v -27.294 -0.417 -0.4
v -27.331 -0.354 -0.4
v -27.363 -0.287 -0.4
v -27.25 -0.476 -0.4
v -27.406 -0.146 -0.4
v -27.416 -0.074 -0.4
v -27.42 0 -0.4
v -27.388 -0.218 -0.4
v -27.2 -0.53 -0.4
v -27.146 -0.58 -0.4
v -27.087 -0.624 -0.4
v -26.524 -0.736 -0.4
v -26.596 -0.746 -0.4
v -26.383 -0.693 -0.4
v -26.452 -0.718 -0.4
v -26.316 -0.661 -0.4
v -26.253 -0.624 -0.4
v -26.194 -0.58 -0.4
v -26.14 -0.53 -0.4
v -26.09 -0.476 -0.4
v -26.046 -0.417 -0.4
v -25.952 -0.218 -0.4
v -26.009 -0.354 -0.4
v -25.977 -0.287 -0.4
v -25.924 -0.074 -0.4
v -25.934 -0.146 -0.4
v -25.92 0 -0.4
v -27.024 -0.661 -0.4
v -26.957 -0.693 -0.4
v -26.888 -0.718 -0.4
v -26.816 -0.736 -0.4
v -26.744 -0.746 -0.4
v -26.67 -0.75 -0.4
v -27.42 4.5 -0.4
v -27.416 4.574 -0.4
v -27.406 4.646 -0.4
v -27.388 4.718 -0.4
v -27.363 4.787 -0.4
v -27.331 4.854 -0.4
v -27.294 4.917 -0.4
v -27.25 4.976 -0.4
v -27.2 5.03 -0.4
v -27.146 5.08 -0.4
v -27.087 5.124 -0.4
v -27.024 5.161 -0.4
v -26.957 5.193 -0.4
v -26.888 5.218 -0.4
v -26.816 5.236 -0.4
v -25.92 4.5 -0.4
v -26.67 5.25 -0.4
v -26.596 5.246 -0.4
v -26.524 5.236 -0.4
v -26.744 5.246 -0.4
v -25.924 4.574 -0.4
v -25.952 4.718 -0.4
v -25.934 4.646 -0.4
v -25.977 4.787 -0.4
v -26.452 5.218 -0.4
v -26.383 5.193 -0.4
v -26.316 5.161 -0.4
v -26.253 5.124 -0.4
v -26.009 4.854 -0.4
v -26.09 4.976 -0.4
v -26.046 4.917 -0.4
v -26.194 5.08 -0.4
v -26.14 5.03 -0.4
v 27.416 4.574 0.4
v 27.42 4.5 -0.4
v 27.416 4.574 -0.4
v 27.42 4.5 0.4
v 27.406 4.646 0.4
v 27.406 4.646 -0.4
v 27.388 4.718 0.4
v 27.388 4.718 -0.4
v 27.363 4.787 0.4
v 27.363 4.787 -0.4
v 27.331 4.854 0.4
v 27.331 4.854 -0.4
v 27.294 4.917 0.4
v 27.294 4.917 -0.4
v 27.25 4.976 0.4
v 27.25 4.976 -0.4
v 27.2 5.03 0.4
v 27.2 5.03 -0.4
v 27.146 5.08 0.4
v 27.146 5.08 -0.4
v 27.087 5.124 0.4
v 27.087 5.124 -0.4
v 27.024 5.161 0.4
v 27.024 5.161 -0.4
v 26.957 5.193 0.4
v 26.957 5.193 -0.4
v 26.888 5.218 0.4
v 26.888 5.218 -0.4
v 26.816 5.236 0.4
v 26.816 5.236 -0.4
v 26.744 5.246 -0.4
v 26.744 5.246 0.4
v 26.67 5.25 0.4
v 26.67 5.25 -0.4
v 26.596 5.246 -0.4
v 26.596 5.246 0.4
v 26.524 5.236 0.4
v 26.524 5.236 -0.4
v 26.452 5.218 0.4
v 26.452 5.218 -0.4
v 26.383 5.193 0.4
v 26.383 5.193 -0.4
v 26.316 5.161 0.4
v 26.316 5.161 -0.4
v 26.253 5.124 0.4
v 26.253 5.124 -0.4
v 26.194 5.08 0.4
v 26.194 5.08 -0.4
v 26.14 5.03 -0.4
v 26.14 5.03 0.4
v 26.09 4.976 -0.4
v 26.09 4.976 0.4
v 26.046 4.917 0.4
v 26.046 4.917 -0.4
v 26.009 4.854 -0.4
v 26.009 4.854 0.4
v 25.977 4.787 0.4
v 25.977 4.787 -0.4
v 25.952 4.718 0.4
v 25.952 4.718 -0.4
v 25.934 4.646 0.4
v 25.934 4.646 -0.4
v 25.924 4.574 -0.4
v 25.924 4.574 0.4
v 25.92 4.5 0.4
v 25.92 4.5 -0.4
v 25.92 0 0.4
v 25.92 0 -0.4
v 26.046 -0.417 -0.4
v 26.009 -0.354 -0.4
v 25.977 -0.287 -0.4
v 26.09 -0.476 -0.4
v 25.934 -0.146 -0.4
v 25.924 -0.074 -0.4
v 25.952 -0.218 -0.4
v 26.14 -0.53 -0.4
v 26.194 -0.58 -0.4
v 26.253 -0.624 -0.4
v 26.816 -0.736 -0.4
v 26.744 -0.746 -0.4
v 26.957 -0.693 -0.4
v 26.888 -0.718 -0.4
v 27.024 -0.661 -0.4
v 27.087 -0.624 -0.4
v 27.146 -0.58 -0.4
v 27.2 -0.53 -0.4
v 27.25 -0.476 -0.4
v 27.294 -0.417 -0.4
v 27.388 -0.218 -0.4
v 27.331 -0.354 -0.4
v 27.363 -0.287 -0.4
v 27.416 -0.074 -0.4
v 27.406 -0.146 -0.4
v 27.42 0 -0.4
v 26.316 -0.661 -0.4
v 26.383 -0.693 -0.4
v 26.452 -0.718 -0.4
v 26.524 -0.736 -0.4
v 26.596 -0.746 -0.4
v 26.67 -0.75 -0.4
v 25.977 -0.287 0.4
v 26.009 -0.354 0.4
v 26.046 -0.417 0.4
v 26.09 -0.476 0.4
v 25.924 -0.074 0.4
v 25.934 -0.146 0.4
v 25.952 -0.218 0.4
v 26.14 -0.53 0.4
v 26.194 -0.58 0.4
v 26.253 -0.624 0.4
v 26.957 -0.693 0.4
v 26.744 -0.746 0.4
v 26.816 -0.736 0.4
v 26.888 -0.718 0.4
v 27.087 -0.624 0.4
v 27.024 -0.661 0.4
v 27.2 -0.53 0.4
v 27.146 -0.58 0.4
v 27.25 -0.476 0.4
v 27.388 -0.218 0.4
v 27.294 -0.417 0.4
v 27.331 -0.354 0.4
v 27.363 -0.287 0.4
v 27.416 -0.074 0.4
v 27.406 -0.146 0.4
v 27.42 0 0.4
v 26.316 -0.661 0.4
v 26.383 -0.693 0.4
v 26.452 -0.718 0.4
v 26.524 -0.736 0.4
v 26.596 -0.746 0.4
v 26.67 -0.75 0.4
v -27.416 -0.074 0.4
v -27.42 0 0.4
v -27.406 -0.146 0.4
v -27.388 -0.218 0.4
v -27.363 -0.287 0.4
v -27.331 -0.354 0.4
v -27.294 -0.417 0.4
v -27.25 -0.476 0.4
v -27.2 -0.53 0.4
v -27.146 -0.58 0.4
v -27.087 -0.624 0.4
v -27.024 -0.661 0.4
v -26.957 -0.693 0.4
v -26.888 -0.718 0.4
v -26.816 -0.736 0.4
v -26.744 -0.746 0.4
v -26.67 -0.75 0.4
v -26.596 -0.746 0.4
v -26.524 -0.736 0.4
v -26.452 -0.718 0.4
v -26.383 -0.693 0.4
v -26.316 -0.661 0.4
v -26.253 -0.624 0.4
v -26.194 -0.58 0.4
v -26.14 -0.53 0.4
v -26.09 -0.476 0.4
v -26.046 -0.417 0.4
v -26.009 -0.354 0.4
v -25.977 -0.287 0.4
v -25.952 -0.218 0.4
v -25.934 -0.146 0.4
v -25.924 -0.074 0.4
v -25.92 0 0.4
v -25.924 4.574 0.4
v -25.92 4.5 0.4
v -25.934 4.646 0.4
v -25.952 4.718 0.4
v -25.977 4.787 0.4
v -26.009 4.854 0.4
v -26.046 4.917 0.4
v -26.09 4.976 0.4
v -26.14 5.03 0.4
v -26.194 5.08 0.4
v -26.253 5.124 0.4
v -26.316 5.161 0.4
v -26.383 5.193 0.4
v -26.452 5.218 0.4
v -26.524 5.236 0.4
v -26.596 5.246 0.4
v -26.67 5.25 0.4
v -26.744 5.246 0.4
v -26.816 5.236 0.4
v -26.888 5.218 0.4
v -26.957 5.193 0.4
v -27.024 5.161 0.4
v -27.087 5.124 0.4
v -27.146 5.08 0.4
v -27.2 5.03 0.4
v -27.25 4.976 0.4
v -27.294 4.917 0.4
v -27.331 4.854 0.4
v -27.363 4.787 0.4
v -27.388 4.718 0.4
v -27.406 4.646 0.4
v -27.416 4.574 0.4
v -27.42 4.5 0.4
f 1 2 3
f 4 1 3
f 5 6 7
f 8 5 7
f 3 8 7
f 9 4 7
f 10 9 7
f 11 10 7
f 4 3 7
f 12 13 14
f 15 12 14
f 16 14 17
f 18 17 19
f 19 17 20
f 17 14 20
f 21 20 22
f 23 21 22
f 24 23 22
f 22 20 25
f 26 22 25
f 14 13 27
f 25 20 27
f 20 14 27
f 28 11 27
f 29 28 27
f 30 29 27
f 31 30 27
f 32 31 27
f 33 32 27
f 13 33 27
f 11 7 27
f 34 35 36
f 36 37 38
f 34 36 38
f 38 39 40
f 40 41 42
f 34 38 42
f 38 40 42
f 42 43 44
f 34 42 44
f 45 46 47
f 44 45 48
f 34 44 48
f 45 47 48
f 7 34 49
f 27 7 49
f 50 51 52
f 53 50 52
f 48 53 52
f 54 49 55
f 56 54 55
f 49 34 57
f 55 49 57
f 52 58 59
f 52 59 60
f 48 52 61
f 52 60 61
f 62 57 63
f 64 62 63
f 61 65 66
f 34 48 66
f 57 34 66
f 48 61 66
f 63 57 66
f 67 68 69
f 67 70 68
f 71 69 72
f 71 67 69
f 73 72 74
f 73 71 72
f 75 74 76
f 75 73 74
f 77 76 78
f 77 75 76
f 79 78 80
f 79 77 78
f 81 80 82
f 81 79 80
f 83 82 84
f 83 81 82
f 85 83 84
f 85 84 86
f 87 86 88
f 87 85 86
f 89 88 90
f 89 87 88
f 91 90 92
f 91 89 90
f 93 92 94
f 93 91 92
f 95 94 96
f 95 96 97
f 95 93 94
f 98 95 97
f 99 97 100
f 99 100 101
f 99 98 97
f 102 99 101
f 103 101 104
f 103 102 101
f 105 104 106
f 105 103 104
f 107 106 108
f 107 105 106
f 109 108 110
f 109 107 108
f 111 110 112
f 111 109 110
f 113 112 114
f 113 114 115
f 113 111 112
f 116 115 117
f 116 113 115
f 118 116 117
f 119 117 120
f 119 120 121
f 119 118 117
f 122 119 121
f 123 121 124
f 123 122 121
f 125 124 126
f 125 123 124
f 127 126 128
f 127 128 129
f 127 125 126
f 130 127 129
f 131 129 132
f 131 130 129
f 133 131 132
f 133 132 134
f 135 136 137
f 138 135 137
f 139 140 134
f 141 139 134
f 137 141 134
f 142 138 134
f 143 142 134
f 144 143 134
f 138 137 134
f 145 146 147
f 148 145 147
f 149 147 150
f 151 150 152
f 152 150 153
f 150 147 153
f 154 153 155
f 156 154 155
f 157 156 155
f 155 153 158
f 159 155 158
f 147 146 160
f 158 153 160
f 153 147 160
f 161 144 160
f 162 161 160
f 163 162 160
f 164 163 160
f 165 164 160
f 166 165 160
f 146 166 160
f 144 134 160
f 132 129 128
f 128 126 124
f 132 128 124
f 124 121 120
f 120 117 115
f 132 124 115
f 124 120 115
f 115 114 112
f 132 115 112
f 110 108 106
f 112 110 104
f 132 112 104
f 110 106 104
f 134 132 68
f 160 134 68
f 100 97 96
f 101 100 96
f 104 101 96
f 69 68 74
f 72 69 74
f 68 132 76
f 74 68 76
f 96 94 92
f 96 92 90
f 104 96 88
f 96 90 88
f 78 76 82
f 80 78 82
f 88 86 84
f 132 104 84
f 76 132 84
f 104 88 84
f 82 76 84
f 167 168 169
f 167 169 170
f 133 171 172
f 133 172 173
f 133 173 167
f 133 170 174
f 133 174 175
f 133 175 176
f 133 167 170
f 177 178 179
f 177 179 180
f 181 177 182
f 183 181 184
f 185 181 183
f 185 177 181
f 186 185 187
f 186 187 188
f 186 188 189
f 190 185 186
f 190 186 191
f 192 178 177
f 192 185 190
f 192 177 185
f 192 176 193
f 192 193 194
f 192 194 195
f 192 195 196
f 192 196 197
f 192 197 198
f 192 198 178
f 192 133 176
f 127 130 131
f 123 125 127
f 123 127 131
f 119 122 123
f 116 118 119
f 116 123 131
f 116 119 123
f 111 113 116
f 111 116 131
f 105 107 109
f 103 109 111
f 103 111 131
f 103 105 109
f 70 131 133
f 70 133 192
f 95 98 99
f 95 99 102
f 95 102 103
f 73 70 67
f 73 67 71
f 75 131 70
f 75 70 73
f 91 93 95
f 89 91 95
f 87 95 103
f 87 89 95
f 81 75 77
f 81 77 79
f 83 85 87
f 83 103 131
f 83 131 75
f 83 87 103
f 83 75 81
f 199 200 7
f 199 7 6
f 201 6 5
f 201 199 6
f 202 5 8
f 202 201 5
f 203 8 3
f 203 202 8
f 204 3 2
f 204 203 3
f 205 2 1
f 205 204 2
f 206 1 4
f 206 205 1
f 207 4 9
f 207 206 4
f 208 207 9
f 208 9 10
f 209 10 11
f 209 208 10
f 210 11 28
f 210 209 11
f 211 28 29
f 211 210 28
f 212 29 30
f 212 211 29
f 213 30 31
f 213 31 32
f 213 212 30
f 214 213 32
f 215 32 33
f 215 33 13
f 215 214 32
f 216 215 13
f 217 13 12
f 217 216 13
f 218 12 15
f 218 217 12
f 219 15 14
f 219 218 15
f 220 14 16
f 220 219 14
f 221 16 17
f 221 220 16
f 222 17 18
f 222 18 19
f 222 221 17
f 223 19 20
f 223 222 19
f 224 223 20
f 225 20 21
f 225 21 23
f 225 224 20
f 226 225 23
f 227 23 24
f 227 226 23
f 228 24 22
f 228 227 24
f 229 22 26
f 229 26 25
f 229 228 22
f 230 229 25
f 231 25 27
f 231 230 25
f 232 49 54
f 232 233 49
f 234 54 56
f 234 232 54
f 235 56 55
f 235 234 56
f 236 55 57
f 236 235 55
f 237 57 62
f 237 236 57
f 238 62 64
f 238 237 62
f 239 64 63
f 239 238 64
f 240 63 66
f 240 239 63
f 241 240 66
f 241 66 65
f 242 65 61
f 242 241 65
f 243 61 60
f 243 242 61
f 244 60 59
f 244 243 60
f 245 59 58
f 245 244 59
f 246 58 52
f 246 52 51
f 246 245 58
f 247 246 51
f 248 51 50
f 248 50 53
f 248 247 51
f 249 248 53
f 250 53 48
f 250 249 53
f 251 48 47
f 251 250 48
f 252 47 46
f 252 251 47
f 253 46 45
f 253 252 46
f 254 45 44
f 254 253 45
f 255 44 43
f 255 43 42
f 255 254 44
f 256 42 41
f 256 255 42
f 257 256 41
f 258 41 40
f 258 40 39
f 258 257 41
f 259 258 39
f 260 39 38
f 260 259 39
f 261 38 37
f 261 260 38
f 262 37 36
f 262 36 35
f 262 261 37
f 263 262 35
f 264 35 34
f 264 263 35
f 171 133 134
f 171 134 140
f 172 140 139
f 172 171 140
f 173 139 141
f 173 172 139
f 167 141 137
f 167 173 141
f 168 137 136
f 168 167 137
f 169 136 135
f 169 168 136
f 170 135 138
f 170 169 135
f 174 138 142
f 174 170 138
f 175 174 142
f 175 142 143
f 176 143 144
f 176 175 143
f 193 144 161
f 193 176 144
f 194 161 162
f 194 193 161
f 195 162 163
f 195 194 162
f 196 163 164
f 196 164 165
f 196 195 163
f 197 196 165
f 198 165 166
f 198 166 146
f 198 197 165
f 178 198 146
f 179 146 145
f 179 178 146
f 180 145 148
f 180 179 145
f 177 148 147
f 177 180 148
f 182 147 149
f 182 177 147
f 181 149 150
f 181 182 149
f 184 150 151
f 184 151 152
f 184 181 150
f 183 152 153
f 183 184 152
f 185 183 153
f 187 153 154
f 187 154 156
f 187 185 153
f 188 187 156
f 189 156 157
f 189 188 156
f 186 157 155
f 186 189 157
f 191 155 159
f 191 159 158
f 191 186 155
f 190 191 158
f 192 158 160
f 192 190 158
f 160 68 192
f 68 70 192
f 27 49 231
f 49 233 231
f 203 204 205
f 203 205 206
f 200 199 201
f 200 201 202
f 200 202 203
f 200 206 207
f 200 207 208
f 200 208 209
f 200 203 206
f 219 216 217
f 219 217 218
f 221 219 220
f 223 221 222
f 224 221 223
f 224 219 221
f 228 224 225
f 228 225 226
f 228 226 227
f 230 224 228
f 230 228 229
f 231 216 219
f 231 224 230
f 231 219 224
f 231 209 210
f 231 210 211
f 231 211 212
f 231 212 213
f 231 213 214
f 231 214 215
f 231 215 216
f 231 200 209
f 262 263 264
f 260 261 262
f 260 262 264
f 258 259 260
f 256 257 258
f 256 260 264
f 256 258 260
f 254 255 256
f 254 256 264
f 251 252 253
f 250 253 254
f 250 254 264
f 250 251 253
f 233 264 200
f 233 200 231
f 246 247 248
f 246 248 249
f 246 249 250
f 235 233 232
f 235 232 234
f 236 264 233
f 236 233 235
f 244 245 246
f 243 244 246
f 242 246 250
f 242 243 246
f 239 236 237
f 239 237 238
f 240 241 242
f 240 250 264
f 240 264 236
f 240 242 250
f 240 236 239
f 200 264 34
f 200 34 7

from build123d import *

# Parameters (mm, degrees)
PAD_DEPTH    = 0.4
PAD001_DEPTH = 0.4


with BuildPart() as feature_ffc_positioner_a:
    # Sketch → Pad (new body, symmetric)
    with BuildSketch(Plane.XY):
        with BuildLine():
            ThreePointArc((-25.92, 4.5), (-26.67, 5.25), (-27.42, 4.5))
            Line((-27.42, 4.5), (-27.42, 0))
            ThreePointArc((-27.42, 0), (-26.67, -0.75), (-25.92, 0))
            Line((-25.92, 4.5), (-25.92, 0))
        make_face()
    extrude(amount=PAD_DEPTH, both=True)


with BuildPart() as feature_ffc_positioner_b:
    # Sketch001 → Pad001 (new body, symmetric)
    with BuildSketch(Plane.XY):
        with BuildLine():
            ThreePointArc((27.42, 4.5), (26.67, 5.25), (25.92, 4.5))
            Line((25.92, 4.5), (25.92, 0))
            ThreePointArc((25.92, 0), (26.67, -0.75), (27.42, 0))
            Line((27.42, 4.5), (27.42, 0))
        make_face()
    extrude(amount=PAD001_DEPTH, both=True)


solid = Compound([feature_ffc_positioner_a.part, feature_ffc_positioner_b.part])
